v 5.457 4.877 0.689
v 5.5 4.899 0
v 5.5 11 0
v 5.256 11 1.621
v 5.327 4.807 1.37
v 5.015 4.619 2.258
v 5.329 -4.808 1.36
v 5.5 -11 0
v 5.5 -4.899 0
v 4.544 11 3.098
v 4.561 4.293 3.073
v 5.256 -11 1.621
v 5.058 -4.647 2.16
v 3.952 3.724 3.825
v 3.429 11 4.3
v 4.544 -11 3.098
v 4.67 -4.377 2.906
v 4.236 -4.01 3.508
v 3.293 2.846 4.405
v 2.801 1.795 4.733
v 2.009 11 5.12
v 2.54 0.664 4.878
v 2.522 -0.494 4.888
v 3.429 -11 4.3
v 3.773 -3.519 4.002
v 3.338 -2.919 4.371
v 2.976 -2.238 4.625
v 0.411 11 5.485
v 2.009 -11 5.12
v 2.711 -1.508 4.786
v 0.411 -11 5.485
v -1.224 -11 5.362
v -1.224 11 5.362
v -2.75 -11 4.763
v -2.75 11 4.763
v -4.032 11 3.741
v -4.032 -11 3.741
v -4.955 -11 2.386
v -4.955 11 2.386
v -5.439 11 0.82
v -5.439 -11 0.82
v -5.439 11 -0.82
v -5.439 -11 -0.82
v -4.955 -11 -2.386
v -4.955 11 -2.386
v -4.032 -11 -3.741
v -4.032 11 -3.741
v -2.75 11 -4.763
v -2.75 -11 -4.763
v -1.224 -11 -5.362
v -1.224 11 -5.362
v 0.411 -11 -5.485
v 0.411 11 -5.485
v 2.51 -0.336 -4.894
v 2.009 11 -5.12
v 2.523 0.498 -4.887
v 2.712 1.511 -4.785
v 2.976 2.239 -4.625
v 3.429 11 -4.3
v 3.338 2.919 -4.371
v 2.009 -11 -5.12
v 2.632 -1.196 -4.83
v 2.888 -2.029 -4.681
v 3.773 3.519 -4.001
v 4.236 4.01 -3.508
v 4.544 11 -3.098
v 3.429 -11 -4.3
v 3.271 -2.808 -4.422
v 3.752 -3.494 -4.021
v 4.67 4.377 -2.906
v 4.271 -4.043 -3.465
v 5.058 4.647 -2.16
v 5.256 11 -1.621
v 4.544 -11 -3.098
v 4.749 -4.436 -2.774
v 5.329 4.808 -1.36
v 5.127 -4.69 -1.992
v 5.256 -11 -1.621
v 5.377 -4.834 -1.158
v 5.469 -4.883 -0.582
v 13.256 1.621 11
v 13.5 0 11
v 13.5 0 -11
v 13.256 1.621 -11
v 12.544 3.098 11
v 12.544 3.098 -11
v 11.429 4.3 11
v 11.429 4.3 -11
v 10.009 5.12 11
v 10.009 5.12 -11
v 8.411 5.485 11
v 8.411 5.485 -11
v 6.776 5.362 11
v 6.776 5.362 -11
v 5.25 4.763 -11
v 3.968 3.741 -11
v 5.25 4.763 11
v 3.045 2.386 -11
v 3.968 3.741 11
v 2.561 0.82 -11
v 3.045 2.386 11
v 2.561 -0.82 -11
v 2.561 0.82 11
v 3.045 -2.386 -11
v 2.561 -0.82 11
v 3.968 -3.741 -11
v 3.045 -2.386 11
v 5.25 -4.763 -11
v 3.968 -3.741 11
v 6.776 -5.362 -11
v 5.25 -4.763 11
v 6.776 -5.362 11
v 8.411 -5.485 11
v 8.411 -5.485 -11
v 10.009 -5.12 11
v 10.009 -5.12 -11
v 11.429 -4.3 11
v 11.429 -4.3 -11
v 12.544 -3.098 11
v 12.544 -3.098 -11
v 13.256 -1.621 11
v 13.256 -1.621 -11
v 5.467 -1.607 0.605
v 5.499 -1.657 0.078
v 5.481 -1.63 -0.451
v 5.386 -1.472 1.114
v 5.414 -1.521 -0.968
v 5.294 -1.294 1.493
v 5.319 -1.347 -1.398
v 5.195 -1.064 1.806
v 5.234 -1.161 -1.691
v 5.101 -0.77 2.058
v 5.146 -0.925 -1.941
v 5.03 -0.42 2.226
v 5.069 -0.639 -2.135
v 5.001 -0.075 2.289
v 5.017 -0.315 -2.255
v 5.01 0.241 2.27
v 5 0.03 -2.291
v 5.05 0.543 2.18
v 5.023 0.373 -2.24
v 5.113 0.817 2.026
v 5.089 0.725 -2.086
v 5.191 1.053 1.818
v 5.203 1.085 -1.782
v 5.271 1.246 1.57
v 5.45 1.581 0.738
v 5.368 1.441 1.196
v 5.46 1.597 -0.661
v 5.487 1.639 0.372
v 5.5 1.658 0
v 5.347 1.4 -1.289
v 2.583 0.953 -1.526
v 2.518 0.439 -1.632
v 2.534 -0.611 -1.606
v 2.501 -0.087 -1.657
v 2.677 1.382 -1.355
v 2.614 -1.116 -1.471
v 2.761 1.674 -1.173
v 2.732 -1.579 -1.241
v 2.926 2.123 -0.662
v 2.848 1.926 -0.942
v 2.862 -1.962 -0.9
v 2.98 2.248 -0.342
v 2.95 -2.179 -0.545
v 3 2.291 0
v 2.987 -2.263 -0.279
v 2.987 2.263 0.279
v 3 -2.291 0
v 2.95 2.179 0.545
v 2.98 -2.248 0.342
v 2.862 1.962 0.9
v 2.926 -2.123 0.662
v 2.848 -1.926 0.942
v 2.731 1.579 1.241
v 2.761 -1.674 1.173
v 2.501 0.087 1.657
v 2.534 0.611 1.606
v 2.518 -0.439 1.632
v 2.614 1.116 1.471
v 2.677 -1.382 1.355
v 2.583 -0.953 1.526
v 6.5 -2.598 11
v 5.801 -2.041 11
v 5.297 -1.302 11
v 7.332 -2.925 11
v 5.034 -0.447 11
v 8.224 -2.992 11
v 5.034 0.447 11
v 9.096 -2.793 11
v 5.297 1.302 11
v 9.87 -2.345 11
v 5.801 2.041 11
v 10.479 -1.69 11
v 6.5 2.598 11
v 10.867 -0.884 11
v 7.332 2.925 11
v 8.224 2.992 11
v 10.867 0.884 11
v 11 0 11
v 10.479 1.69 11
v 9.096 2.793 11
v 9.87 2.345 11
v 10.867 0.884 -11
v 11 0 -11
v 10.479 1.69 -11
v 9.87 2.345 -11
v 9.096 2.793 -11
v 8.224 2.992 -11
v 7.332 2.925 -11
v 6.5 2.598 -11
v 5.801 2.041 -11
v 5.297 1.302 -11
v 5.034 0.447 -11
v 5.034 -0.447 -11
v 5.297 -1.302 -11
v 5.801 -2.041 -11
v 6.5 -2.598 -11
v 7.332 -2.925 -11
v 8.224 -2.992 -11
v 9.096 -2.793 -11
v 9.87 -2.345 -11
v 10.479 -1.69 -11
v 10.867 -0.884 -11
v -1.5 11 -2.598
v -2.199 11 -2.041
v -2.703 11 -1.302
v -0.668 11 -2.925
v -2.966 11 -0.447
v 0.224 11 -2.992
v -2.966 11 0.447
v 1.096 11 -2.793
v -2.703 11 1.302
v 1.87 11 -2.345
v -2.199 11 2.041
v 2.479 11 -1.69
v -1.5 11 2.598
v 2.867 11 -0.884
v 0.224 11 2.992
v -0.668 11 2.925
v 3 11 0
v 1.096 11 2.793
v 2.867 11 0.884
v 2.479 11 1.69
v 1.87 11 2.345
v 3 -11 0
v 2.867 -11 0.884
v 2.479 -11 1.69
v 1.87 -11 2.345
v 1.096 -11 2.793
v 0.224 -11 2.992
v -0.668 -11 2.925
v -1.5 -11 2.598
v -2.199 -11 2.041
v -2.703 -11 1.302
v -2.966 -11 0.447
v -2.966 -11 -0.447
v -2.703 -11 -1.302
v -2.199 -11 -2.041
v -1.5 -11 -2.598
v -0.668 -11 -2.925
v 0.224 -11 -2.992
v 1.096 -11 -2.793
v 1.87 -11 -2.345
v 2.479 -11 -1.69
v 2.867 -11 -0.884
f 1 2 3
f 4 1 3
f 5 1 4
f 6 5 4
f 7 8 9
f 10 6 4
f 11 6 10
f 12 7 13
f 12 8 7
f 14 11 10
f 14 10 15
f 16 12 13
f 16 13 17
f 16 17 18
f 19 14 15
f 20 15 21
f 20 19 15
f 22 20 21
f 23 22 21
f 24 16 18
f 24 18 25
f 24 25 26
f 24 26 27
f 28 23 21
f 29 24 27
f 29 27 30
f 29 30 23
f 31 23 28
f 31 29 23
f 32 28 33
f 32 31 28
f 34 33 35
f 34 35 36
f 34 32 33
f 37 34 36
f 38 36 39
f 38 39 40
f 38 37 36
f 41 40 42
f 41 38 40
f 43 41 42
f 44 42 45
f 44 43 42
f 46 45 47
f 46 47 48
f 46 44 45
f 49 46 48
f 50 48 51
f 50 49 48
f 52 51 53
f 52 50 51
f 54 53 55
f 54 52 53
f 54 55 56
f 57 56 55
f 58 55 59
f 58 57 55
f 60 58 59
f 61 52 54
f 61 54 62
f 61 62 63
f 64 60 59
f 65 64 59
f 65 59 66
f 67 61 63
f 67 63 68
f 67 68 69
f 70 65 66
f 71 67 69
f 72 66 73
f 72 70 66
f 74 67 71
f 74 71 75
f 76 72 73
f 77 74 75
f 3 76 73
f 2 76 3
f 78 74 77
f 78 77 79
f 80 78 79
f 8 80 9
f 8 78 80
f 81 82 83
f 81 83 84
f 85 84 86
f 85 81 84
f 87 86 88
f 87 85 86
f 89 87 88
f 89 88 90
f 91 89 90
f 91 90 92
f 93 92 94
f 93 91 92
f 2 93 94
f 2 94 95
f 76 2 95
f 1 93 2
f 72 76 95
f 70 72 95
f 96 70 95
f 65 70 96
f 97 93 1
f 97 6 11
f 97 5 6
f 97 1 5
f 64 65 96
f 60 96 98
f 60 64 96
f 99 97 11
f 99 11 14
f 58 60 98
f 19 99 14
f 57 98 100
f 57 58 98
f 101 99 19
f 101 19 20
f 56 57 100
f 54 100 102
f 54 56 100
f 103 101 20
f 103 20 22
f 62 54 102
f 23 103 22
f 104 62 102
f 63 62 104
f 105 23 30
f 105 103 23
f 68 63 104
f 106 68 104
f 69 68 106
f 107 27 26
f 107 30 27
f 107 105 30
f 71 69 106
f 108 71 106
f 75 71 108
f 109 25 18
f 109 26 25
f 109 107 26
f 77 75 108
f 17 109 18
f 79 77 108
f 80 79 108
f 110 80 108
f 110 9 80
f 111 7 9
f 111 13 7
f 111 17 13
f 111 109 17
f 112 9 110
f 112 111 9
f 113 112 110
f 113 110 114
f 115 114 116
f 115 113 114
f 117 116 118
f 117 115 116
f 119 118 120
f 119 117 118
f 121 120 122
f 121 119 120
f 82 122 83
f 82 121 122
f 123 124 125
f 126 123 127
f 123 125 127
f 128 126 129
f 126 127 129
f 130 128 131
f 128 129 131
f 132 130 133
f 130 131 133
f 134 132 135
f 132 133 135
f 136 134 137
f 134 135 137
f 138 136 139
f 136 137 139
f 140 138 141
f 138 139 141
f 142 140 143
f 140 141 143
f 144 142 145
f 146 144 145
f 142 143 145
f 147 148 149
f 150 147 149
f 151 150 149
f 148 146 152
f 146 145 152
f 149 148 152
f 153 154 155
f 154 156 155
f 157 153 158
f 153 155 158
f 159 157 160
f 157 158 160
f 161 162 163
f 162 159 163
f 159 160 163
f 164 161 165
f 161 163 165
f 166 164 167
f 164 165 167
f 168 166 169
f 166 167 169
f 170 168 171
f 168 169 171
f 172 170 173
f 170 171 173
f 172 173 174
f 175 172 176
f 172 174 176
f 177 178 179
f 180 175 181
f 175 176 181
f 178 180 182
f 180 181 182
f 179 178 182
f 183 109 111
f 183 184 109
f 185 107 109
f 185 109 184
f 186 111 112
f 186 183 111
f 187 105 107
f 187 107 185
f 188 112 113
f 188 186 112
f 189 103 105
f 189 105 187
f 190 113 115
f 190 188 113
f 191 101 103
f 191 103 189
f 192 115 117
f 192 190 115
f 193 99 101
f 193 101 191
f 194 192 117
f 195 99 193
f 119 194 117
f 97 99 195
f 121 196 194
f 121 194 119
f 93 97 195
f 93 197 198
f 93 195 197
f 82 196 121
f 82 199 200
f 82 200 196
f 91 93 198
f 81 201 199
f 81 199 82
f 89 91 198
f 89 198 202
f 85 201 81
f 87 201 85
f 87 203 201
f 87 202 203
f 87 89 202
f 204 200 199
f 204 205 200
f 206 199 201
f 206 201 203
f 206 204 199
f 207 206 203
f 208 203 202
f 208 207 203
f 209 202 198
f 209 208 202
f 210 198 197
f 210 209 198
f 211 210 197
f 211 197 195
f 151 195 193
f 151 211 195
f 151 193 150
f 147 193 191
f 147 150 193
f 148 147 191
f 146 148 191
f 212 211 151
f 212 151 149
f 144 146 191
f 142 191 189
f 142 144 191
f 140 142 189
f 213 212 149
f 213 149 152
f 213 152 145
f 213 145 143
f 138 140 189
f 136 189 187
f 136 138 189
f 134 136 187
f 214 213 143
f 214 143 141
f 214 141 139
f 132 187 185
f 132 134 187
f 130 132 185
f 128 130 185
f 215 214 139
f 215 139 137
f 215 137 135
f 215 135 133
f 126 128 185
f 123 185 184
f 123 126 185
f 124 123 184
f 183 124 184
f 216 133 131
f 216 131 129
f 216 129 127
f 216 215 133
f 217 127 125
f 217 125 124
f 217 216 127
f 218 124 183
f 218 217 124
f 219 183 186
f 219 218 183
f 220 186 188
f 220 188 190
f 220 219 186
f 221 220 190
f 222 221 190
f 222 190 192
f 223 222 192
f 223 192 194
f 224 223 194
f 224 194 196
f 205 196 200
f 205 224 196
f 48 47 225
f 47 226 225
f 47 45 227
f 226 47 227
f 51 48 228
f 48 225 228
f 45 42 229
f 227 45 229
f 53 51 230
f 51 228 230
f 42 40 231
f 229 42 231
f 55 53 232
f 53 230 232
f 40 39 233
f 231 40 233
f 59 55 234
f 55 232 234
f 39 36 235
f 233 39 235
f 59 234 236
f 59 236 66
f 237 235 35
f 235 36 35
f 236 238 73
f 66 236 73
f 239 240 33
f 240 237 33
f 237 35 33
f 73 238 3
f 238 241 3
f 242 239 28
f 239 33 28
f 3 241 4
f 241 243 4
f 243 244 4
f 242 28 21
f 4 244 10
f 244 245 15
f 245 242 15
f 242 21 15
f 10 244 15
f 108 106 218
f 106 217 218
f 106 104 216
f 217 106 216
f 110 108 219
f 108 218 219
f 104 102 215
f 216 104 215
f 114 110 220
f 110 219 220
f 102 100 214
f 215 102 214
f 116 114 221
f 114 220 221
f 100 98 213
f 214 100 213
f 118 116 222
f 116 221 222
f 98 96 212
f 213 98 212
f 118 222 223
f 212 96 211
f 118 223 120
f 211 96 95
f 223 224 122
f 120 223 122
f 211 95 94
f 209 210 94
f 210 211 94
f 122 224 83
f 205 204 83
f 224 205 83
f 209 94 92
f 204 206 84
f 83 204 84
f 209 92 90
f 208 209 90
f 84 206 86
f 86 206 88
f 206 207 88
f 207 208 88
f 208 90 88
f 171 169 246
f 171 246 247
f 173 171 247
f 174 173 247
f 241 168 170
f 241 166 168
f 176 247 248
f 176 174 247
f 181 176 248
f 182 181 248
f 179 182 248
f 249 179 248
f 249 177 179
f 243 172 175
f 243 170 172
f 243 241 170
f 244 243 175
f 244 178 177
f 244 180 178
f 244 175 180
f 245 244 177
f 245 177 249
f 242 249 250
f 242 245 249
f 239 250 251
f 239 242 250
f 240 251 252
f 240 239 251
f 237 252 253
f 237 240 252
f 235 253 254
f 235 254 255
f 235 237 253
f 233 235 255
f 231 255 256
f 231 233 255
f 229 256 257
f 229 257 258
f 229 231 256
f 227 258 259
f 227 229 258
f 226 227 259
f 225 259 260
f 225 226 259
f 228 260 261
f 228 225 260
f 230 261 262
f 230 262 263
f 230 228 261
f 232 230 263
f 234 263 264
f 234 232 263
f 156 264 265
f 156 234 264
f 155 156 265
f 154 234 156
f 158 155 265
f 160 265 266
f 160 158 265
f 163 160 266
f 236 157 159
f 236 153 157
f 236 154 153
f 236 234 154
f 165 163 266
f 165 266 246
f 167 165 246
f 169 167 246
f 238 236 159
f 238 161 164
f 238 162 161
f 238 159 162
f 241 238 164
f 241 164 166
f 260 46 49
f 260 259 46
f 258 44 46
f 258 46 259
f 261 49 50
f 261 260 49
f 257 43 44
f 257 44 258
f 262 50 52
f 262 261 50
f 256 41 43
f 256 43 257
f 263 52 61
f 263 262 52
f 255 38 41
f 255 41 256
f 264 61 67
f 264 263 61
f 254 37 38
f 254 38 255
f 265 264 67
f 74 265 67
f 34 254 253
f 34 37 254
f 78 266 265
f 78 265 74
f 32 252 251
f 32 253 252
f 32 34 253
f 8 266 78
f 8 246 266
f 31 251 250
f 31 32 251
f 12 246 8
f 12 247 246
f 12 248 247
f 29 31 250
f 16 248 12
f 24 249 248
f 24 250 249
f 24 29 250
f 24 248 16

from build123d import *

# Parameters (mm, degrees)
F0_R     = 3
F0_R_2   = 5.5
F1_DEPTH = 11
F2_R     = 3
F2_R_2   = 5.5
F3_DEPTH = 11
F4_R     = 3
F5_DEPTH = 12.5
F6_R     = 3
F7_DEPTH = 22.001


with BuildPart() as f1:
    # F0 (on Front) → F1 (new body, symmetric)
    with BuildSketch(Plane.XZ):
        Circle(F0_R)
        Circle(F0_R_2)
        Circle(F0_R, mode=Mode.SUBTRACT)
    extrude(amount=F1_DEPTH, both=True)

    # F2 (on Top) → F3 (join, symmetric)
    with BuildSketch(Plane.XY):
        with Locations((8, 0)):
            Circle(F2_R)
        with Locations((8, 0)):
            Circle(F2_R_2)
        with Locations((8, 0)):
            Circle(F2_R, mode=Mode.SUBTRACT)
    extrude(amount=F3_DEPTH, both=True)

    # F4 (on Front) → F5 (cut, symmetric)
    with BuildSketch(Plane.XZ):
        Circle(F4_R)
    extrude(amount=F5_DEPTH, both=True, mode=Mode.SUBTRACT)

    # F6 (on face) → F7 (cut, through all)
    with BuildSketch(Plane(origin=(0, 0, -11), x_dir=(1, 0, 0), z_dir=(0, 0, -1))):
        with Locations((8, 0)):
            Circle(F6_R)
    extrude(amount=-F7_DEPTH, mode=Mode.SUBTRACT)


solid = f1.part
